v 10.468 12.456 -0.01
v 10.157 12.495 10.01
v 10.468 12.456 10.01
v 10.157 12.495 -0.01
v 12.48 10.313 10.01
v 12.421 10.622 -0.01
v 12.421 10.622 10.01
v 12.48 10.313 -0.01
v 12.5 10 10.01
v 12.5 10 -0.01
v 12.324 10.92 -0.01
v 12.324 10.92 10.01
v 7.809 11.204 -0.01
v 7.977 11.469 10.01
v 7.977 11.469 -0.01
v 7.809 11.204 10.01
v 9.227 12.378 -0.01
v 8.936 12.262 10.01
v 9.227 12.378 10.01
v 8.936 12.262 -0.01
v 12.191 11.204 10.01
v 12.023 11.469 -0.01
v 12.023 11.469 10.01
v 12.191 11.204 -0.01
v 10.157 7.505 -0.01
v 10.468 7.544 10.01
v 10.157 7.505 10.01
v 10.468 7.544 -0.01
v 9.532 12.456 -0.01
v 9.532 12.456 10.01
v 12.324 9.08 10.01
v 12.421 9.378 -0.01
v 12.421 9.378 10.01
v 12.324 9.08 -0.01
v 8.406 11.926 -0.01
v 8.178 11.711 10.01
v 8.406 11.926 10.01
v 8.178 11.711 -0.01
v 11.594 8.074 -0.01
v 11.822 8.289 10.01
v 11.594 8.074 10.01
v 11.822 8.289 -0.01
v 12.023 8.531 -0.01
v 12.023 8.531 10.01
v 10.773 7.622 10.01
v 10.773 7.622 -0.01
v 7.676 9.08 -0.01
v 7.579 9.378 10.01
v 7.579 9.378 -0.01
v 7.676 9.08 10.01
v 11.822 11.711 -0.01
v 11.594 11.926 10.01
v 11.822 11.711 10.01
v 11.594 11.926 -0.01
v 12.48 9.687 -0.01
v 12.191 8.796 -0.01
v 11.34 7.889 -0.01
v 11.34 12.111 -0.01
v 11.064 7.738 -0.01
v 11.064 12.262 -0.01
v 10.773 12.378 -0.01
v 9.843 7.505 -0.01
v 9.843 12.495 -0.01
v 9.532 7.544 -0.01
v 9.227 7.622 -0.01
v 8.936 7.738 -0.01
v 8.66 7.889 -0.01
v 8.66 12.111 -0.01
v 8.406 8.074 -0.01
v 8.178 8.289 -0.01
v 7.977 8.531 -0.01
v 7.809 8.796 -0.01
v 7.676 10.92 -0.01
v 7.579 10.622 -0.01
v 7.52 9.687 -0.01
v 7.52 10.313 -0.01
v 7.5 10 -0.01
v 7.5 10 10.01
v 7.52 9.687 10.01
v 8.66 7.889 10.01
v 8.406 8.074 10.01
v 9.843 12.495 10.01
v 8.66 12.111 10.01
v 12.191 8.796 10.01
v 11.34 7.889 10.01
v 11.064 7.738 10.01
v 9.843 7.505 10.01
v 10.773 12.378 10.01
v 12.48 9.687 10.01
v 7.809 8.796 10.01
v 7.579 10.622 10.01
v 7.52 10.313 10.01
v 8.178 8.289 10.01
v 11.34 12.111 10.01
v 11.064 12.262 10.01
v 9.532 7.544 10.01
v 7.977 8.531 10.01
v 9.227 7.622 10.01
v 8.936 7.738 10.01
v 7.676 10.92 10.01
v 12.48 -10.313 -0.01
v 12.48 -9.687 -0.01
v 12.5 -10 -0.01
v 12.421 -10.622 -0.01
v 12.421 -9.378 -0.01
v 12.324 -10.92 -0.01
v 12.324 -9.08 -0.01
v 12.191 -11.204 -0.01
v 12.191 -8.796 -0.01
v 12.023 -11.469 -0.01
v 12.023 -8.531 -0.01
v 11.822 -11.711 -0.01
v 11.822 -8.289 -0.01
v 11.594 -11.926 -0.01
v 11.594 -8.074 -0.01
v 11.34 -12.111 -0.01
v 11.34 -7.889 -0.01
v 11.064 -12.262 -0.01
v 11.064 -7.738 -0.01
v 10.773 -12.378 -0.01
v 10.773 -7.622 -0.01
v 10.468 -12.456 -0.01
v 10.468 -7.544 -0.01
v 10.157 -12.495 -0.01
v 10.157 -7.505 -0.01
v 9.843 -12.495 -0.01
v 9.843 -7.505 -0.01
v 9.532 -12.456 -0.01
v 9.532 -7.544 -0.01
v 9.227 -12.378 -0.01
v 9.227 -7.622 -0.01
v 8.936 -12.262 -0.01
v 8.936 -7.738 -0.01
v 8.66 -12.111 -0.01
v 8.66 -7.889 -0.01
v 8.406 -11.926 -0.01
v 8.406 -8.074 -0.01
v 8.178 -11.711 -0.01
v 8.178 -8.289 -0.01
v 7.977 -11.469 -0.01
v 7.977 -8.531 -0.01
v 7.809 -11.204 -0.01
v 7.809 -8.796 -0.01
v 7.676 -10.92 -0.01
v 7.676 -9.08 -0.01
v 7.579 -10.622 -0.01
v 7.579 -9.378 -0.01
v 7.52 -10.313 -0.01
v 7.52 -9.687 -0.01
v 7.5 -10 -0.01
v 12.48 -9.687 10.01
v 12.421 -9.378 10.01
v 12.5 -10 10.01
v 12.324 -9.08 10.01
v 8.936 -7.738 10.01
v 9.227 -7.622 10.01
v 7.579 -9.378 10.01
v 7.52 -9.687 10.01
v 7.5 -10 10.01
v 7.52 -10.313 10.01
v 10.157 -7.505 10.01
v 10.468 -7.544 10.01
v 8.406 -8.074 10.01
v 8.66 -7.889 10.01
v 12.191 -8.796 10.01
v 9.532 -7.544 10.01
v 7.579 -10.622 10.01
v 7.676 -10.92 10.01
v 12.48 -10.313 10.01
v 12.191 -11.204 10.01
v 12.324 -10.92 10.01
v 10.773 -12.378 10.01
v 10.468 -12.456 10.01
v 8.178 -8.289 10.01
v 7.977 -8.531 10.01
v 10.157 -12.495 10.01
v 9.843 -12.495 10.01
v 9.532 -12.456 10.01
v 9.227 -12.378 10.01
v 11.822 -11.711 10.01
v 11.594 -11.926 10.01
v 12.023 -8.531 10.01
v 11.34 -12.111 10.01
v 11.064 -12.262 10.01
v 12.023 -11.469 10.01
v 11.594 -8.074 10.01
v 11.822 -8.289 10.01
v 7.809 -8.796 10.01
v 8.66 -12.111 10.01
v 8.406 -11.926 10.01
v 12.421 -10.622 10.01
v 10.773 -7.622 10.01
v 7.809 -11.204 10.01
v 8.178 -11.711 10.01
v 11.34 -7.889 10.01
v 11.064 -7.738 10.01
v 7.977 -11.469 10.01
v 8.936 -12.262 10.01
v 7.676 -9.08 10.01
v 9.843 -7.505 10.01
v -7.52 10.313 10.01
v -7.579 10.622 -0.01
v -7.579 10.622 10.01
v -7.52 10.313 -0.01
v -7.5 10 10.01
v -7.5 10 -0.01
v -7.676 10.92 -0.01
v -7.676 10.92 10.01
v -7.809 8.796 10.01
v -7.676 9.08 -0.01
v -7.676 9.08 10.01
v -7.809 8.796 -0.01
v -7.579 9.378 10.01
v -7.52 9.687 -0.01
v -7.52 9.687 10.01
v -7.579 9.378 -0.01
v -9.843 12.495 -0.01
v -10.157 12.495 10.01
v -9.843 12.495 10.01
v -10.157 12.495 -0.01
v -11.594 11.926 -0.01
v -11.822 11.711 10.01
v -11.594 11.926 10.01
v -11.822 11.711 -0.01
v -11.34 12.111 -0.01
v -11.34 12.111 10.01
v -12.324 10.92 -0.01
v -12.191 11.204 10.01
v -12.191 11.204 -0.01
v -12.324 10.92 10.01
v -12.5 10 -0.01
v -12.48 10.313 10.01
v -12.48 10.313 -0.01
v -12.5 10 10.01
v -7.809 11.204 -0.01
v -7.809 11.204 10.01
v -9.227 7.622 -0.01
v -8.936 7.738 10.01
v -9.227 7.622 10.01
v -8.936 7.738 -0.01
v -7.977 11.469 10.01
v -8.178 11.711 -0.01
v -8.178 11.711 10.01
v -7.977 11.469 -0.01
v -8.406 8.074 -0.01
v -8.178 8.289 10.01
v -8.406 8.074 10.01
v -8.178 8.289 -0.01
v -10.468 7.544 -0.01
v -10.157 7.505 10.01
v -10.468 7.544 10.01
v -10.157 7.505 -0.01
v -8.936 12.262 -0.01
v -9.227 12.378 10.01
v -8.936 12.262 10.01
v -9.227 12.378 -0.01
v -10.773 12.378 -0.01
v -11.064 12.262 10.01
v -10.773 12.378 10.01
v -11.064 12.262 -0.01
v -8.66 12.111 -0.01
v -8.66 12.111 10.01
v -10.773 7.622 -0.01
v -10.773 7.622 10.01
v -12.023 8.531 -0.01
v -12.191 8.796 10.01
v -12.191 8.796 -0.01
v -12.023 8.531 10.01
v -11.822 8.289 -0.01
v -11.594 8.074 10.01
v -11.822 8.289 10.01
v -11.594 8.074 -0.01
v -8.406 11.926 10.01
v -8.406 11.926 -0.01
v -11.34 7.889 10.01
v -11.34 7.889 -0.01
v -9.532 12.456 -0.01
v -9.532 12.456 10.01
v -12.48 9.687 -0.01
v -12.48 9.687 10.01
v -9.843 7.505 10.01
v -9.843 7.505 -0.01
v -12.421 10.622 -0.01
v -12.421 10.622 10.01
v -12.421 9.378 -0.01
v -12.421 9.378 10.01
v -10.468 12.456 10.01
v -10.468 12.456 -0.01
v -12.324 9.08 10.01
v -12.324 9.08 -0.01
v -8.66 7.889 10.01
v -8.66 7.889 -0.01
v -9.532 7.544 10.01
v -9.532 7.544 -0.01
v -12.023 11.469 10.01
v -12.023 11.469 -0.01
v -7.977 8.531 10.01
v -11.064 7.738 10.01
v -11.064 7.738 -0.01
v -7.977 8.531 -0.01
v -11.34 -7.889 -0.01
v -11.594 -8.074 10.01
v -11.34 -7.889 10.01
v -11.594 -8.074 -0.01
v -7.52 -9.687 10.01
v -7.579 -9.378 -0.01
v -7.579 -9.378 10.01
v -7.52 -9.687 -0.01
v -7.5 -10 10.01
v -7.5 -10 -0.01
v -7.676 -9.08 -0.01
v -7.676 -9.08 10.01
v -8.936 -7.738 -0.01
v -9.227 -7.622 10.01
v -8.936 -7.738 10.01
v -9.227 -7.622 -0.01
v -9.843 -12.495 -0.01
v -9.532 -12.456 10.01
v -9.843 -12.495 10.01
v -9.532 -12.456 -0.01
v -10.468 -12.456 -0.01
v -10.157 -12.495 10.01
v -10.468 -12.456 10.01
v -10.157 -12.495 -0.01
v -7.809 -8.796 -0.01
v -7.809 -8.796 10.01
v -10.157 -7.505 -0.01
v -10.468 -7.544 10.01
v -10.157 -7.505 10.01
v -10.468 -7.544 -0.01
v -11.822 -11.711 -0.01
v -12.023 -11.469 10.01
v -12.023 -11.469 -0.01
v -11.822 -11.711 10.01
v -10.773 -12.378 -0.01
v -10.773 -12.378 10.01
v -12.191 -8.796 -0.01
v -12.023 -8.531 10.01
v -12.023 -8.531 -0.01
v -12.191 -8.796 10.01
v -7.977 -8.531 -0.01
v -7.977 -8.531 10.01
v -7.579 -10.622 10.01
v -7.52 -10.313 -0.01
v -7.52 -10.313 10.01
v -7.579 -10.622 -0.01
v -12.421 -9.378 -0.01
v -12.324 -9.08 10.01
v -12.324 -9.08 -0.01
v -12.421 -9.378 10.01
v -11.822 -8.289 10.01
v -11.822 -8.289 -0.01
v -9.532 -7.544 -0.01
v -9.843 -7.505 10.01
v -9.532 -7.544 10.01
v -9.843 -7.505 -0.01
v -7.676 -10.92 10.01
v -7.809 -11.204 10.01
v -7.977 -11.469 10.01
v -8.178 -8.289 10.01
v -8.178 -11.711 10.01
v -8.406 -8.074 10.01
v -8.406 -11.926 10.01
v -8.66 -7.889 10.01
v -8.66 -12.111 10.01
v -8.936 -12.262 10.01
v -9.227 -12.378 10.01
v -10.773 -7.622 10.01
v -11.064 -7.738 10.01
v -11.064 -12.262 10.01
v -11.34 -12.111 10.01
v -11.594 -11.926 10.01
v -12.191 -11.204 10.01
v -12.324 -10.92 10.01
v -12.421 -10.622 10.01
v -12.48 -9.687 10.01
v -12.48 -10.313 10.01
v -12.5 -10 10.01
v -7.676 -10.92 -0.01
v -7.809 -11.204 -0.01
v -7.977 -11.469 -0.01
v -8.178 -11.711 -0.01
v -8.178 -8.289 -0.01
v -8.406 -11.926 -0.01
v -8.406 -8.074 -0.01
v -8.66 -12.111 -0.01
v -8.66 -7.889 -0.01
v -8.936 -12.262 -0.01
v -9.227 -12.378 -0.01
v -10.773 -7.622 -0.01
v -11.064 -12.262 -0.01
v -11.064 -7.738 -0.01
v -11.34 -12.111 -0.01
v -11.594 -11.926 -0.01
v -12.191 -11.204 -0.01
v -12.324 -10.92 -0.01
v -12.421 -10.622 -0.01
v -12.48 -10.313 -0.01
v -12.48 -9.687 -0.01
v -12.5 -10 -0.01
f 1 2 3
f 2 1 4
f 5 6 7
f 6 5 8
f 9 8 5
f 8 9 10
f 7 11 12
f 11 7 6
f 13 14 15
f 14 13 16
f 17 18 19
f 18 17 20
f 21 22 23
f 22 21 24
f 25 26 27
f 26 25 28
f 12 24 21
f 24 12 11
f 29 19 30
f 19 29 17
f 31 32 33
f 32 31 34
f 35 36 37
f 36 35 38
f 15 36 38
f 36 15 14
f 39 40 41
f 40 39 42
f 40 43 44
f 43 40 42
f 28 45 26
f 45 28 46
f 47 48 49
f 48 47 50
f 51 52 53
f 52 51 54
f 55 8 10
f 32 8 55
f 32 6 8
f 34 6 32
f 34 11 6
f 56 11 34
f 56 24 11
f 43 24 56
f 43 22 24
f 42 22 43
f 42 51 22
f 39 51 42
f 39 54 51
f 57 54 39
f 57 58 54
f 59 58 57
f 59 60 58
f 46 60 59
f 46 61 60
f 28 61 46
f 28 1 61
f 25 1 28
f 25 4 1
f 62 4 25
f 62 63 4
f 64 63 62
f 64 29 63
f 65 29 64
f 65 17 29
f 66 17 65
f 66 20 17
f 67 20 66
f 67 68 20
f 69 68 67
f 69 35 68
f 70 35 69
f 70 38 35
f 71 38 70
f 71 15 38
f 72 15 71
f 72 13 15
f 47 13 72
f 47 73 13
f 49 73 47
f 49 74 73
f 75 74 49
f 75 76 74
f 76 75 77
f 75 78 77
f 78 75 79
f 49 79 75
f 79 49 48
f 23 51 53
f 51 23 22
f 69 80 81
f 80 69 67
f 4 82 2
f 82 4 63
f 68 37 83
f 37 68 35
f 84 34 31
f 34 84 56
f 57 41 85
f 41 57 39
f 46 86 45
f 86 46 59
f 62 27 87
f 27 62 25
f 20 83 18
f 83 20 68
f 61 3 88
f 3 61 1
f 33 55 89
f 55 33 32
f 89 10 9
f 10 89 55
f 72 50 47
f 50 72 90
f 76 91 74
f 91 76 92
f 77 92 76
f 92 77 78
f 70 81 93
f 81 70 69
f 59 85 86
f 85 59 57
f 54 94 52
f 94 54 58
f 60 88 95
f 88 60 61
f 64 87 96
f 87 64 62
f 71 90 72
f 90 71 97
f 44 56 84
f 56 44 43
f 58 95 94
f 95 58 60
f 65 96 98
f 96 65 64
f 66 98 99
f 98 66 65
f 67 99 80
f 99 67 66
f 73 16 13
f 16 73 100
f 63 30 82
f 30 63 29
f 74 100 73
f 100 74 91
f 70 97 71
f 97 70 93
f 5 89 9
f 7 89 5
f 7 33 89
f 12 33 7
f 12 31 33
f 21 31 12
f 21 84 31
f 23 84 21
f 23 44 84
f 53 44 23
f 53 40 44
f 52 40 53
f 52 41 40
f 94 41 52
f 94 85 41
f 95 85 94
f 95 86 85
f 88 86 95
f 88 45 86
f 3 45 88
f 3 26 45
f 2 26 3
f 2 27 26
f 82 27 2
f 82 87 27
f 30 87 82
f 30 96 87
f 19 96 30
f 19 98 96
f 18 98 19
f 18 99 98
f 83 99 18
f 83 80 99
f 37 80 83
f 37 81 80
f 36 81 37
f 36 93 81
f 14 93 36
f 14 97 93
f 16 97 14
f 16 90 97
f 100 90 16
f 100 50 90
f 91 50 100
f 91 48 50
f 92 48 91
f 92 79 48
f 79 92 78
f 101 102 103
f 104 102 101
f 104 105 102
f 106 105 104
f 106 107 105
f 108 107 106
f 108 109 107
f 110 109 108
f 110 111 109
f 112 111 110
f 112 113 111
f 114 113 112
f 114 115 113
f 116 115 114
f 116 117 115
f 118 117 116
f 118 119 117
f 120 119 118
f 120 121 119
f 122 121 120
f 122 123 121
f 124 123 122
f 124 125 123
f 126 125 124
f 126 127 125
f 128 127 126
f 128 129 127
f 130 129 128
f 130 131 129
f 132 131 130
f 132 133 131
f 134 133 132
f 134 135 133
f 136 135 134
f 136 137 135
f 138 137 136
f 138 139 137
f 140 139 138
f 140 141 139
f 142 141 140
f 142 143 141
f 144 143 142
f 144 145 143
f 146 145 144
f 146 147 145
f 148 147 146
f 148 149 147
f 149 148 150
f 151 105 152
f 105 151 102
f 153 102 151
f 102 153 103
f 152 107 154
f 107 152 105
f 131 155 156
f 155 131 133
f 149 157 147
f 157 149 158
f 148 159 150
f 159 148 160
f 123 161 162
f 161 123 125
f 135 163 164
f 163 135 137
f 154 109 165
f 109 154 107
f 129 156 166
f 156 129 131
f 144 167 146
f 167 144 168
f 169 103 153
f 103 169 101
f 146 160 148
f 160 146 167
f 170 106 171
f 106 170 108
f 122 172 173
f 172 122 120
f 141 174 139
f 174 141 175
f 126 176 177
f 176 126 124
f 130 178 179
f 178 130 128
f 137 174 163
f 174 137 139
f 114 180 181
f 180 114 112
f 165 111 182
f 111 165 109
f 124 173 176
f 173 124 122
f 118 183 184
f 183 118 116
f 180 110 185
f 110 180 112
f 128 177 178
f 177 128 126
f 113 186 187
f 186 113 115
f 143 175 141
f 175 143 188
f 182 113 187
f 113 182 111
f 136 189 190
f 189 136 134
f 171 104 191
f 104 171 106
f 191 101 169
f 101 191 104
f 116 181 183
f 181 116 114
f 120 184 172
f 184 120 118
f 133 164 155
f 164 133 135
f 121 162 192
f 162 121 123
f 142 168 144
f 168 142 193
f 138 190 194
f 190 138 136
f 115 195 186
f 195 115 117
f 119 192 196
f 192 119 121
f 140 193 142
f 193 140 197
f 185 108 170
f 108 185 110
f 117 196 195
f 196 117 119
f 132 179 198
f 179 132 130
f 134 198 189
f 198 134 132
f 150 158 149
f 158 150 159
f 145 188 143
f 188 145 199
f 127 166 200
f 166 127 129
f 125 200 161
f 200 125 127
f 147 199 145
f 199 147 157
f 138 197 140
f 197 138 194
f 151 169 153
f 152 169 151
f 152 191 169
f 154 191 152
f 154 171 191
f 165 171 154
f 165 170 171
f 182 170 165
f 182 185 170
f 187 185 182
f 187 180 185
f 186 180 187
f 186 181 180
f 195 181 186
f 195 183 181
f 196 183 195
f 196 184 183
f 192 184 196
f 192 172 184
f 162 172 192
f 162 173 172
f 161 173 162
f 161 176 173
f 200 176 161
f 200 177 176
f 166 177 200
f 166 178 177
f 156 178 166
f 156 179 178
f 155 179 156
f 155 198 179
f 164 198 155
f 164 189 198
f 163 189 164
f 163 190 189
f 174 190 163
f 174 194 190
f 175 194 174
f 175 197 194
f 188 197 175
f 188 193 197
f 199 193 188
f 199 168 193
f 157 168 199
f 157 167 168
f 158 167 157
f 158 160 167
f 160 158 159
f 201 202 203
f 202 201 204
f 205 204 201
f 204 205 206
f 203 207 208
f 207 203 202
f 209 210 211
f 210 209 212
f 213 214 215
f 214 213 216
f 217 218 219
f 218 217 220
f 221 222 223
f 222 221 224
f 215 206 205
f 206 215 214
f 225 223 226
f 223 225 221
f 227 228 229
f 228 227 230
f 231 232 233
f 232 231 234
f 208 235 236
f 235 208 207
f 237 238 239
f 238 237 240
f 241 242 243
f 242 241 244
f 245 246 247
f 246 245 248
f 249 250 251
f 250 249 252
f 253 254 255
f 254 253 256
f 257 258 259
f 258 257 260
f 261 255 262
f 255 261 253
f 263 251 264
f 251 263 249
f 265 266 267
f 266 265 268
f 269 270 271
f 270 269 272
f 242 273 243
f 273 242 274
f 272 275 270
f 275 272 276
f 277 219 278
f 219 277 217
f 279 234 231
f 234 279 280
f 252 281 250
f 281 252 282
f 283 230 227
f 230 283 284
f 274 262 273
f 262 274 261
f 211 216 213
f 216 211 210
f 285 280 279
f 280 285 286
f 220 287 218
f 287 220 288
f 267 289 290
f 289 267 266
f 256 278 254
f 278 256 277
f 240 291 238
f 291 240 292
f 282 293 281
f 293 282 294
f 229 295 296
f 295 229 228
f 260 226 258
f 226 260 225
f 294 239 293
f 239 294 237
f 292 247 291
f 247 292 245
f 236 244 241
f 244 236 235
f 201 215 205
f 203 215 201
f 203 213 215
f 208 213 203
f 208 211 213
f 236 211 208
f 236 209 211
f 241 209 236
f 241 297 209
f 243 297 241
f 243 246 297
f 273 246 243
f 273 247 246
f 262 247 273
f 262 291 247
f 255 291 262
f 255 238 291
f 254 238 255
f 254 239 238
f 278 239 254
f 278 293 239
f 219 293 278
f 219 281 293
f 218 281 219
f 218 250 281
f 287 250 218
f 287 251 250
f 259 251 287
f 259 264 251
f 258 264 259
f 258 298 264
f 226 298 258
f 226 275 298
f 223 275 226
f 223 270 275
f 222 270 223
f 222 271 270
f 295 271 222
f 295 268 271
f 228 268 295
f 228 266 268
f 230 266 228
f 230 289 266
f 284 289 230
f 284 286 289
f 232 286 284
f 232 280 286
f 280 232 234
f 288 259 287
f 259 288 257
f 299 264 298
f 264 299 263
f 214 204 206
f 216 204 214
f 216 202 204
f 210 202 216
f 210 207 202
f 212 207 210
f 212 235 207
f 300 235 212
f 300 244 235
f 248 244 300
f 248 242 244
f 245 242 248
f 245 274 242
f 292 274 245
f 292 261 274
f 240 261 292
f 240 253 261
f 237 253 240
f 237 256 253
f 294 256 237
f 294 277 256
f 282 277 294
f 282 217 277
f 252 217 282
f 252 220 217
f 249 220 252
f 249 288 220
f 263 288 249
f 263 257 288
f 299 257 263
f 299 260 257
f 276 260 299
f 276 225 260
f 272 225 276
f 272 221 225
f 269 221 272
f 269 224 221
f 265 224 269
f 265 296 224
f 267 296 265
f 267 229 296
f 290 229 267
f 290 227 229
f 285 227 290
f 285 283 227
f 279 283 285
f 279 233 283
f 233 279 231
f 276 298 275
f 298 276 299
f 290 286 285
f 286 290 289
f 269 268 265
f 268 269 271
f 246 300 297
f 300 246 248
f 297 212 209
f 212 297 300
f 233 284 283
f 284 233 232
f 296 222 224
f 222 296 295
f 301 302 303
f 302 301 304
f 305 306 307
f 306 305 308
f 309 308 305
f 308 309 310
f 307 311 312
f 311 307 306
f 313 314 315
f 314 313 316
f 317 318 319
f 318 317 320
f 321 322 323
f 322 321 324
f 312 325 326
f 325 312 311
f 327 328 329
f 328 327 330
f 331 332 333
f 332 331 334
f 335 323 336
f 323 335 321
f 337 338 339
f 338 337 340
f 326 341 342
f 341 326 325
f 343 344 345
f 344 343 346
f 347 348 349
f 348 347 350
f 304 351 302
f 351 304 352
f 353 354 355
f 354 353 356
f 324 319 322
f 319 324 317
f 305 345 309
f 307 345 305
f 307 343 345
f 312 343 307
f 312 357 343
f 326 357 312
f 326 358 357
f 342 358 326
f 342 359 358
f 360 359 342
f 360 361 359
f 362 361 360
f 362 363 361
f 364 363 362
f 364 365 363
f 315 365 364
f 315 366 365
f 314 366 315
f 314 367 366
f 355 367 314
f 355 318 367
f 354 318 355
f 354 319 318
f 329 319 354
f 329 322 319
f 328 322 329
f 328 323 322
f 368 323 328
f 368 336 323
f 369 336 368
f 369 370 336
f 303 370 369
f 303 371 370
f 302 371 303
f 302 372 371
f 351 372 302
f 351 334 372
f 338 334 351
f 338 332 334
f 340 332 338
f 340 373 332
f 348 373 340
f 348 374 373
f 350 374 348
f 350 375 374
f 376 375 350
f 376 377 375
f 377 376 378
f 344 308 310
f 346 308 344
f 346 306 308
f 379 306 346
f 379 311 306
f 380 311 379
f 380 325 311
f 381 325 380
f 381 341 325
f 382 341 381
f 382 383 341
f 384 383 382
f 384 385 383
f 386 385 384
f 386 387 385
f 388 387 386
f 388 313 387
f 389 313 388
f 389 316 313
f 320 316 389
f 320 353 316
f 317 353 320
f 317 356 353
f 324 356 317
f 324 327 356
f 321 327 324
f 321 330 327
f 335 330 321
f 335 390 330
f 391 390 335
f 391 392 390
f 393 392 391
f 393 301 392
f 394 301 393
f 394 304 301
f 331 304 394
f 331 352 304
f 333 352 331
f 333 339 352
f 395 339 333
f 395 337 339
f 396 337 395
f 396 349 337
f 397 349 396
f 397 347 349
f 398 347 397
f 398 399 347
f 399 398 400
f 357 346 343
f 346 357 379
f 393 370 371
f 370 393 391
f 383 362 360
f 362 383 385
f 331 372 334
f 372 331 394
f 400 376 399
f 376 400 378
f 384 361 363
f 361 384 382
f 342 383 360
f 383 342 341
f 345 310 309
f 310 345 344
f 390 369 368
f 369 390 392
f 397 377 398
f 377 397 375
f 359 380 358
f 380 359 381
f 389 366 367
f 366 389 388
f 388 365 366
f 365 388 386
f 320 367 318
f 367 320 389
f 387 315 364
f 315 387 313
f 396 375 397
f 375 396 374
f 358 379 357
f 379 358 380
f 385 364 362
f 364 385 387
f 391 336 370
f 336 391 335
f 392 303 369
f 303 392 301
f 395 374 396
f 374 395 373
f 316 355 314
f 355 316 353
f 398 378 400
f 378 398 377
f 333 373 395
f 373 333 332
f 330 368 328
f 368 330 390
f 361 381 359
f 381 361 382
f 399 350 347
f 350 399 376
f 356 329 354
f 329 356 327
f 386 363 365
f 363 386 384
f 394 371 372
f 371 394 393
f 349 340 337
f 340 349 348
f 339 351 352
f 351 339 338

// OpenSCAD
// file: round-hole.scad
// Round Hole

// Defaults

gRes = 50;
gNudge = 0.01;

module RoundHole(
	PosX,	        // drill position x
	PosY,	        // drill position y
	Dia,		        // drill diameter
	Depth,	        // drill depth
	Res = gRes,		// render resolution
	Nudge = gNudge)	// render error compensation
	{
	translate([PosX,PosY,-Nudge]) 
	cylinder(h = Nudge + Depth + Nudge, d = Dia, $fn = Res);
	}

// Demo

RoundHole(10,15,5,10);
// main file
// Round Holes

use <round-hole.scad>;

// Defaults

gRes = 50;
gNudge = 0.01;

module RoundHoles(
	DrillSched,		// drill schedule list, [[PosX,PosY,Dia,Depth],...]
	Res = gRes,		// render resolution
	Nudge = gNudge)	// render error compensation
	{
	for(sched = DrillSched)
		{
		RoundHole(sched[0], sched[1], sched[2], sched[3], Res = gRes, Nudge = gNudge);
		}
	}

// Demo

RoundHoles([[10,10,5,10],[10,-10,5,10],[-10,10,5,10],[-10,-10,5,10]]);
